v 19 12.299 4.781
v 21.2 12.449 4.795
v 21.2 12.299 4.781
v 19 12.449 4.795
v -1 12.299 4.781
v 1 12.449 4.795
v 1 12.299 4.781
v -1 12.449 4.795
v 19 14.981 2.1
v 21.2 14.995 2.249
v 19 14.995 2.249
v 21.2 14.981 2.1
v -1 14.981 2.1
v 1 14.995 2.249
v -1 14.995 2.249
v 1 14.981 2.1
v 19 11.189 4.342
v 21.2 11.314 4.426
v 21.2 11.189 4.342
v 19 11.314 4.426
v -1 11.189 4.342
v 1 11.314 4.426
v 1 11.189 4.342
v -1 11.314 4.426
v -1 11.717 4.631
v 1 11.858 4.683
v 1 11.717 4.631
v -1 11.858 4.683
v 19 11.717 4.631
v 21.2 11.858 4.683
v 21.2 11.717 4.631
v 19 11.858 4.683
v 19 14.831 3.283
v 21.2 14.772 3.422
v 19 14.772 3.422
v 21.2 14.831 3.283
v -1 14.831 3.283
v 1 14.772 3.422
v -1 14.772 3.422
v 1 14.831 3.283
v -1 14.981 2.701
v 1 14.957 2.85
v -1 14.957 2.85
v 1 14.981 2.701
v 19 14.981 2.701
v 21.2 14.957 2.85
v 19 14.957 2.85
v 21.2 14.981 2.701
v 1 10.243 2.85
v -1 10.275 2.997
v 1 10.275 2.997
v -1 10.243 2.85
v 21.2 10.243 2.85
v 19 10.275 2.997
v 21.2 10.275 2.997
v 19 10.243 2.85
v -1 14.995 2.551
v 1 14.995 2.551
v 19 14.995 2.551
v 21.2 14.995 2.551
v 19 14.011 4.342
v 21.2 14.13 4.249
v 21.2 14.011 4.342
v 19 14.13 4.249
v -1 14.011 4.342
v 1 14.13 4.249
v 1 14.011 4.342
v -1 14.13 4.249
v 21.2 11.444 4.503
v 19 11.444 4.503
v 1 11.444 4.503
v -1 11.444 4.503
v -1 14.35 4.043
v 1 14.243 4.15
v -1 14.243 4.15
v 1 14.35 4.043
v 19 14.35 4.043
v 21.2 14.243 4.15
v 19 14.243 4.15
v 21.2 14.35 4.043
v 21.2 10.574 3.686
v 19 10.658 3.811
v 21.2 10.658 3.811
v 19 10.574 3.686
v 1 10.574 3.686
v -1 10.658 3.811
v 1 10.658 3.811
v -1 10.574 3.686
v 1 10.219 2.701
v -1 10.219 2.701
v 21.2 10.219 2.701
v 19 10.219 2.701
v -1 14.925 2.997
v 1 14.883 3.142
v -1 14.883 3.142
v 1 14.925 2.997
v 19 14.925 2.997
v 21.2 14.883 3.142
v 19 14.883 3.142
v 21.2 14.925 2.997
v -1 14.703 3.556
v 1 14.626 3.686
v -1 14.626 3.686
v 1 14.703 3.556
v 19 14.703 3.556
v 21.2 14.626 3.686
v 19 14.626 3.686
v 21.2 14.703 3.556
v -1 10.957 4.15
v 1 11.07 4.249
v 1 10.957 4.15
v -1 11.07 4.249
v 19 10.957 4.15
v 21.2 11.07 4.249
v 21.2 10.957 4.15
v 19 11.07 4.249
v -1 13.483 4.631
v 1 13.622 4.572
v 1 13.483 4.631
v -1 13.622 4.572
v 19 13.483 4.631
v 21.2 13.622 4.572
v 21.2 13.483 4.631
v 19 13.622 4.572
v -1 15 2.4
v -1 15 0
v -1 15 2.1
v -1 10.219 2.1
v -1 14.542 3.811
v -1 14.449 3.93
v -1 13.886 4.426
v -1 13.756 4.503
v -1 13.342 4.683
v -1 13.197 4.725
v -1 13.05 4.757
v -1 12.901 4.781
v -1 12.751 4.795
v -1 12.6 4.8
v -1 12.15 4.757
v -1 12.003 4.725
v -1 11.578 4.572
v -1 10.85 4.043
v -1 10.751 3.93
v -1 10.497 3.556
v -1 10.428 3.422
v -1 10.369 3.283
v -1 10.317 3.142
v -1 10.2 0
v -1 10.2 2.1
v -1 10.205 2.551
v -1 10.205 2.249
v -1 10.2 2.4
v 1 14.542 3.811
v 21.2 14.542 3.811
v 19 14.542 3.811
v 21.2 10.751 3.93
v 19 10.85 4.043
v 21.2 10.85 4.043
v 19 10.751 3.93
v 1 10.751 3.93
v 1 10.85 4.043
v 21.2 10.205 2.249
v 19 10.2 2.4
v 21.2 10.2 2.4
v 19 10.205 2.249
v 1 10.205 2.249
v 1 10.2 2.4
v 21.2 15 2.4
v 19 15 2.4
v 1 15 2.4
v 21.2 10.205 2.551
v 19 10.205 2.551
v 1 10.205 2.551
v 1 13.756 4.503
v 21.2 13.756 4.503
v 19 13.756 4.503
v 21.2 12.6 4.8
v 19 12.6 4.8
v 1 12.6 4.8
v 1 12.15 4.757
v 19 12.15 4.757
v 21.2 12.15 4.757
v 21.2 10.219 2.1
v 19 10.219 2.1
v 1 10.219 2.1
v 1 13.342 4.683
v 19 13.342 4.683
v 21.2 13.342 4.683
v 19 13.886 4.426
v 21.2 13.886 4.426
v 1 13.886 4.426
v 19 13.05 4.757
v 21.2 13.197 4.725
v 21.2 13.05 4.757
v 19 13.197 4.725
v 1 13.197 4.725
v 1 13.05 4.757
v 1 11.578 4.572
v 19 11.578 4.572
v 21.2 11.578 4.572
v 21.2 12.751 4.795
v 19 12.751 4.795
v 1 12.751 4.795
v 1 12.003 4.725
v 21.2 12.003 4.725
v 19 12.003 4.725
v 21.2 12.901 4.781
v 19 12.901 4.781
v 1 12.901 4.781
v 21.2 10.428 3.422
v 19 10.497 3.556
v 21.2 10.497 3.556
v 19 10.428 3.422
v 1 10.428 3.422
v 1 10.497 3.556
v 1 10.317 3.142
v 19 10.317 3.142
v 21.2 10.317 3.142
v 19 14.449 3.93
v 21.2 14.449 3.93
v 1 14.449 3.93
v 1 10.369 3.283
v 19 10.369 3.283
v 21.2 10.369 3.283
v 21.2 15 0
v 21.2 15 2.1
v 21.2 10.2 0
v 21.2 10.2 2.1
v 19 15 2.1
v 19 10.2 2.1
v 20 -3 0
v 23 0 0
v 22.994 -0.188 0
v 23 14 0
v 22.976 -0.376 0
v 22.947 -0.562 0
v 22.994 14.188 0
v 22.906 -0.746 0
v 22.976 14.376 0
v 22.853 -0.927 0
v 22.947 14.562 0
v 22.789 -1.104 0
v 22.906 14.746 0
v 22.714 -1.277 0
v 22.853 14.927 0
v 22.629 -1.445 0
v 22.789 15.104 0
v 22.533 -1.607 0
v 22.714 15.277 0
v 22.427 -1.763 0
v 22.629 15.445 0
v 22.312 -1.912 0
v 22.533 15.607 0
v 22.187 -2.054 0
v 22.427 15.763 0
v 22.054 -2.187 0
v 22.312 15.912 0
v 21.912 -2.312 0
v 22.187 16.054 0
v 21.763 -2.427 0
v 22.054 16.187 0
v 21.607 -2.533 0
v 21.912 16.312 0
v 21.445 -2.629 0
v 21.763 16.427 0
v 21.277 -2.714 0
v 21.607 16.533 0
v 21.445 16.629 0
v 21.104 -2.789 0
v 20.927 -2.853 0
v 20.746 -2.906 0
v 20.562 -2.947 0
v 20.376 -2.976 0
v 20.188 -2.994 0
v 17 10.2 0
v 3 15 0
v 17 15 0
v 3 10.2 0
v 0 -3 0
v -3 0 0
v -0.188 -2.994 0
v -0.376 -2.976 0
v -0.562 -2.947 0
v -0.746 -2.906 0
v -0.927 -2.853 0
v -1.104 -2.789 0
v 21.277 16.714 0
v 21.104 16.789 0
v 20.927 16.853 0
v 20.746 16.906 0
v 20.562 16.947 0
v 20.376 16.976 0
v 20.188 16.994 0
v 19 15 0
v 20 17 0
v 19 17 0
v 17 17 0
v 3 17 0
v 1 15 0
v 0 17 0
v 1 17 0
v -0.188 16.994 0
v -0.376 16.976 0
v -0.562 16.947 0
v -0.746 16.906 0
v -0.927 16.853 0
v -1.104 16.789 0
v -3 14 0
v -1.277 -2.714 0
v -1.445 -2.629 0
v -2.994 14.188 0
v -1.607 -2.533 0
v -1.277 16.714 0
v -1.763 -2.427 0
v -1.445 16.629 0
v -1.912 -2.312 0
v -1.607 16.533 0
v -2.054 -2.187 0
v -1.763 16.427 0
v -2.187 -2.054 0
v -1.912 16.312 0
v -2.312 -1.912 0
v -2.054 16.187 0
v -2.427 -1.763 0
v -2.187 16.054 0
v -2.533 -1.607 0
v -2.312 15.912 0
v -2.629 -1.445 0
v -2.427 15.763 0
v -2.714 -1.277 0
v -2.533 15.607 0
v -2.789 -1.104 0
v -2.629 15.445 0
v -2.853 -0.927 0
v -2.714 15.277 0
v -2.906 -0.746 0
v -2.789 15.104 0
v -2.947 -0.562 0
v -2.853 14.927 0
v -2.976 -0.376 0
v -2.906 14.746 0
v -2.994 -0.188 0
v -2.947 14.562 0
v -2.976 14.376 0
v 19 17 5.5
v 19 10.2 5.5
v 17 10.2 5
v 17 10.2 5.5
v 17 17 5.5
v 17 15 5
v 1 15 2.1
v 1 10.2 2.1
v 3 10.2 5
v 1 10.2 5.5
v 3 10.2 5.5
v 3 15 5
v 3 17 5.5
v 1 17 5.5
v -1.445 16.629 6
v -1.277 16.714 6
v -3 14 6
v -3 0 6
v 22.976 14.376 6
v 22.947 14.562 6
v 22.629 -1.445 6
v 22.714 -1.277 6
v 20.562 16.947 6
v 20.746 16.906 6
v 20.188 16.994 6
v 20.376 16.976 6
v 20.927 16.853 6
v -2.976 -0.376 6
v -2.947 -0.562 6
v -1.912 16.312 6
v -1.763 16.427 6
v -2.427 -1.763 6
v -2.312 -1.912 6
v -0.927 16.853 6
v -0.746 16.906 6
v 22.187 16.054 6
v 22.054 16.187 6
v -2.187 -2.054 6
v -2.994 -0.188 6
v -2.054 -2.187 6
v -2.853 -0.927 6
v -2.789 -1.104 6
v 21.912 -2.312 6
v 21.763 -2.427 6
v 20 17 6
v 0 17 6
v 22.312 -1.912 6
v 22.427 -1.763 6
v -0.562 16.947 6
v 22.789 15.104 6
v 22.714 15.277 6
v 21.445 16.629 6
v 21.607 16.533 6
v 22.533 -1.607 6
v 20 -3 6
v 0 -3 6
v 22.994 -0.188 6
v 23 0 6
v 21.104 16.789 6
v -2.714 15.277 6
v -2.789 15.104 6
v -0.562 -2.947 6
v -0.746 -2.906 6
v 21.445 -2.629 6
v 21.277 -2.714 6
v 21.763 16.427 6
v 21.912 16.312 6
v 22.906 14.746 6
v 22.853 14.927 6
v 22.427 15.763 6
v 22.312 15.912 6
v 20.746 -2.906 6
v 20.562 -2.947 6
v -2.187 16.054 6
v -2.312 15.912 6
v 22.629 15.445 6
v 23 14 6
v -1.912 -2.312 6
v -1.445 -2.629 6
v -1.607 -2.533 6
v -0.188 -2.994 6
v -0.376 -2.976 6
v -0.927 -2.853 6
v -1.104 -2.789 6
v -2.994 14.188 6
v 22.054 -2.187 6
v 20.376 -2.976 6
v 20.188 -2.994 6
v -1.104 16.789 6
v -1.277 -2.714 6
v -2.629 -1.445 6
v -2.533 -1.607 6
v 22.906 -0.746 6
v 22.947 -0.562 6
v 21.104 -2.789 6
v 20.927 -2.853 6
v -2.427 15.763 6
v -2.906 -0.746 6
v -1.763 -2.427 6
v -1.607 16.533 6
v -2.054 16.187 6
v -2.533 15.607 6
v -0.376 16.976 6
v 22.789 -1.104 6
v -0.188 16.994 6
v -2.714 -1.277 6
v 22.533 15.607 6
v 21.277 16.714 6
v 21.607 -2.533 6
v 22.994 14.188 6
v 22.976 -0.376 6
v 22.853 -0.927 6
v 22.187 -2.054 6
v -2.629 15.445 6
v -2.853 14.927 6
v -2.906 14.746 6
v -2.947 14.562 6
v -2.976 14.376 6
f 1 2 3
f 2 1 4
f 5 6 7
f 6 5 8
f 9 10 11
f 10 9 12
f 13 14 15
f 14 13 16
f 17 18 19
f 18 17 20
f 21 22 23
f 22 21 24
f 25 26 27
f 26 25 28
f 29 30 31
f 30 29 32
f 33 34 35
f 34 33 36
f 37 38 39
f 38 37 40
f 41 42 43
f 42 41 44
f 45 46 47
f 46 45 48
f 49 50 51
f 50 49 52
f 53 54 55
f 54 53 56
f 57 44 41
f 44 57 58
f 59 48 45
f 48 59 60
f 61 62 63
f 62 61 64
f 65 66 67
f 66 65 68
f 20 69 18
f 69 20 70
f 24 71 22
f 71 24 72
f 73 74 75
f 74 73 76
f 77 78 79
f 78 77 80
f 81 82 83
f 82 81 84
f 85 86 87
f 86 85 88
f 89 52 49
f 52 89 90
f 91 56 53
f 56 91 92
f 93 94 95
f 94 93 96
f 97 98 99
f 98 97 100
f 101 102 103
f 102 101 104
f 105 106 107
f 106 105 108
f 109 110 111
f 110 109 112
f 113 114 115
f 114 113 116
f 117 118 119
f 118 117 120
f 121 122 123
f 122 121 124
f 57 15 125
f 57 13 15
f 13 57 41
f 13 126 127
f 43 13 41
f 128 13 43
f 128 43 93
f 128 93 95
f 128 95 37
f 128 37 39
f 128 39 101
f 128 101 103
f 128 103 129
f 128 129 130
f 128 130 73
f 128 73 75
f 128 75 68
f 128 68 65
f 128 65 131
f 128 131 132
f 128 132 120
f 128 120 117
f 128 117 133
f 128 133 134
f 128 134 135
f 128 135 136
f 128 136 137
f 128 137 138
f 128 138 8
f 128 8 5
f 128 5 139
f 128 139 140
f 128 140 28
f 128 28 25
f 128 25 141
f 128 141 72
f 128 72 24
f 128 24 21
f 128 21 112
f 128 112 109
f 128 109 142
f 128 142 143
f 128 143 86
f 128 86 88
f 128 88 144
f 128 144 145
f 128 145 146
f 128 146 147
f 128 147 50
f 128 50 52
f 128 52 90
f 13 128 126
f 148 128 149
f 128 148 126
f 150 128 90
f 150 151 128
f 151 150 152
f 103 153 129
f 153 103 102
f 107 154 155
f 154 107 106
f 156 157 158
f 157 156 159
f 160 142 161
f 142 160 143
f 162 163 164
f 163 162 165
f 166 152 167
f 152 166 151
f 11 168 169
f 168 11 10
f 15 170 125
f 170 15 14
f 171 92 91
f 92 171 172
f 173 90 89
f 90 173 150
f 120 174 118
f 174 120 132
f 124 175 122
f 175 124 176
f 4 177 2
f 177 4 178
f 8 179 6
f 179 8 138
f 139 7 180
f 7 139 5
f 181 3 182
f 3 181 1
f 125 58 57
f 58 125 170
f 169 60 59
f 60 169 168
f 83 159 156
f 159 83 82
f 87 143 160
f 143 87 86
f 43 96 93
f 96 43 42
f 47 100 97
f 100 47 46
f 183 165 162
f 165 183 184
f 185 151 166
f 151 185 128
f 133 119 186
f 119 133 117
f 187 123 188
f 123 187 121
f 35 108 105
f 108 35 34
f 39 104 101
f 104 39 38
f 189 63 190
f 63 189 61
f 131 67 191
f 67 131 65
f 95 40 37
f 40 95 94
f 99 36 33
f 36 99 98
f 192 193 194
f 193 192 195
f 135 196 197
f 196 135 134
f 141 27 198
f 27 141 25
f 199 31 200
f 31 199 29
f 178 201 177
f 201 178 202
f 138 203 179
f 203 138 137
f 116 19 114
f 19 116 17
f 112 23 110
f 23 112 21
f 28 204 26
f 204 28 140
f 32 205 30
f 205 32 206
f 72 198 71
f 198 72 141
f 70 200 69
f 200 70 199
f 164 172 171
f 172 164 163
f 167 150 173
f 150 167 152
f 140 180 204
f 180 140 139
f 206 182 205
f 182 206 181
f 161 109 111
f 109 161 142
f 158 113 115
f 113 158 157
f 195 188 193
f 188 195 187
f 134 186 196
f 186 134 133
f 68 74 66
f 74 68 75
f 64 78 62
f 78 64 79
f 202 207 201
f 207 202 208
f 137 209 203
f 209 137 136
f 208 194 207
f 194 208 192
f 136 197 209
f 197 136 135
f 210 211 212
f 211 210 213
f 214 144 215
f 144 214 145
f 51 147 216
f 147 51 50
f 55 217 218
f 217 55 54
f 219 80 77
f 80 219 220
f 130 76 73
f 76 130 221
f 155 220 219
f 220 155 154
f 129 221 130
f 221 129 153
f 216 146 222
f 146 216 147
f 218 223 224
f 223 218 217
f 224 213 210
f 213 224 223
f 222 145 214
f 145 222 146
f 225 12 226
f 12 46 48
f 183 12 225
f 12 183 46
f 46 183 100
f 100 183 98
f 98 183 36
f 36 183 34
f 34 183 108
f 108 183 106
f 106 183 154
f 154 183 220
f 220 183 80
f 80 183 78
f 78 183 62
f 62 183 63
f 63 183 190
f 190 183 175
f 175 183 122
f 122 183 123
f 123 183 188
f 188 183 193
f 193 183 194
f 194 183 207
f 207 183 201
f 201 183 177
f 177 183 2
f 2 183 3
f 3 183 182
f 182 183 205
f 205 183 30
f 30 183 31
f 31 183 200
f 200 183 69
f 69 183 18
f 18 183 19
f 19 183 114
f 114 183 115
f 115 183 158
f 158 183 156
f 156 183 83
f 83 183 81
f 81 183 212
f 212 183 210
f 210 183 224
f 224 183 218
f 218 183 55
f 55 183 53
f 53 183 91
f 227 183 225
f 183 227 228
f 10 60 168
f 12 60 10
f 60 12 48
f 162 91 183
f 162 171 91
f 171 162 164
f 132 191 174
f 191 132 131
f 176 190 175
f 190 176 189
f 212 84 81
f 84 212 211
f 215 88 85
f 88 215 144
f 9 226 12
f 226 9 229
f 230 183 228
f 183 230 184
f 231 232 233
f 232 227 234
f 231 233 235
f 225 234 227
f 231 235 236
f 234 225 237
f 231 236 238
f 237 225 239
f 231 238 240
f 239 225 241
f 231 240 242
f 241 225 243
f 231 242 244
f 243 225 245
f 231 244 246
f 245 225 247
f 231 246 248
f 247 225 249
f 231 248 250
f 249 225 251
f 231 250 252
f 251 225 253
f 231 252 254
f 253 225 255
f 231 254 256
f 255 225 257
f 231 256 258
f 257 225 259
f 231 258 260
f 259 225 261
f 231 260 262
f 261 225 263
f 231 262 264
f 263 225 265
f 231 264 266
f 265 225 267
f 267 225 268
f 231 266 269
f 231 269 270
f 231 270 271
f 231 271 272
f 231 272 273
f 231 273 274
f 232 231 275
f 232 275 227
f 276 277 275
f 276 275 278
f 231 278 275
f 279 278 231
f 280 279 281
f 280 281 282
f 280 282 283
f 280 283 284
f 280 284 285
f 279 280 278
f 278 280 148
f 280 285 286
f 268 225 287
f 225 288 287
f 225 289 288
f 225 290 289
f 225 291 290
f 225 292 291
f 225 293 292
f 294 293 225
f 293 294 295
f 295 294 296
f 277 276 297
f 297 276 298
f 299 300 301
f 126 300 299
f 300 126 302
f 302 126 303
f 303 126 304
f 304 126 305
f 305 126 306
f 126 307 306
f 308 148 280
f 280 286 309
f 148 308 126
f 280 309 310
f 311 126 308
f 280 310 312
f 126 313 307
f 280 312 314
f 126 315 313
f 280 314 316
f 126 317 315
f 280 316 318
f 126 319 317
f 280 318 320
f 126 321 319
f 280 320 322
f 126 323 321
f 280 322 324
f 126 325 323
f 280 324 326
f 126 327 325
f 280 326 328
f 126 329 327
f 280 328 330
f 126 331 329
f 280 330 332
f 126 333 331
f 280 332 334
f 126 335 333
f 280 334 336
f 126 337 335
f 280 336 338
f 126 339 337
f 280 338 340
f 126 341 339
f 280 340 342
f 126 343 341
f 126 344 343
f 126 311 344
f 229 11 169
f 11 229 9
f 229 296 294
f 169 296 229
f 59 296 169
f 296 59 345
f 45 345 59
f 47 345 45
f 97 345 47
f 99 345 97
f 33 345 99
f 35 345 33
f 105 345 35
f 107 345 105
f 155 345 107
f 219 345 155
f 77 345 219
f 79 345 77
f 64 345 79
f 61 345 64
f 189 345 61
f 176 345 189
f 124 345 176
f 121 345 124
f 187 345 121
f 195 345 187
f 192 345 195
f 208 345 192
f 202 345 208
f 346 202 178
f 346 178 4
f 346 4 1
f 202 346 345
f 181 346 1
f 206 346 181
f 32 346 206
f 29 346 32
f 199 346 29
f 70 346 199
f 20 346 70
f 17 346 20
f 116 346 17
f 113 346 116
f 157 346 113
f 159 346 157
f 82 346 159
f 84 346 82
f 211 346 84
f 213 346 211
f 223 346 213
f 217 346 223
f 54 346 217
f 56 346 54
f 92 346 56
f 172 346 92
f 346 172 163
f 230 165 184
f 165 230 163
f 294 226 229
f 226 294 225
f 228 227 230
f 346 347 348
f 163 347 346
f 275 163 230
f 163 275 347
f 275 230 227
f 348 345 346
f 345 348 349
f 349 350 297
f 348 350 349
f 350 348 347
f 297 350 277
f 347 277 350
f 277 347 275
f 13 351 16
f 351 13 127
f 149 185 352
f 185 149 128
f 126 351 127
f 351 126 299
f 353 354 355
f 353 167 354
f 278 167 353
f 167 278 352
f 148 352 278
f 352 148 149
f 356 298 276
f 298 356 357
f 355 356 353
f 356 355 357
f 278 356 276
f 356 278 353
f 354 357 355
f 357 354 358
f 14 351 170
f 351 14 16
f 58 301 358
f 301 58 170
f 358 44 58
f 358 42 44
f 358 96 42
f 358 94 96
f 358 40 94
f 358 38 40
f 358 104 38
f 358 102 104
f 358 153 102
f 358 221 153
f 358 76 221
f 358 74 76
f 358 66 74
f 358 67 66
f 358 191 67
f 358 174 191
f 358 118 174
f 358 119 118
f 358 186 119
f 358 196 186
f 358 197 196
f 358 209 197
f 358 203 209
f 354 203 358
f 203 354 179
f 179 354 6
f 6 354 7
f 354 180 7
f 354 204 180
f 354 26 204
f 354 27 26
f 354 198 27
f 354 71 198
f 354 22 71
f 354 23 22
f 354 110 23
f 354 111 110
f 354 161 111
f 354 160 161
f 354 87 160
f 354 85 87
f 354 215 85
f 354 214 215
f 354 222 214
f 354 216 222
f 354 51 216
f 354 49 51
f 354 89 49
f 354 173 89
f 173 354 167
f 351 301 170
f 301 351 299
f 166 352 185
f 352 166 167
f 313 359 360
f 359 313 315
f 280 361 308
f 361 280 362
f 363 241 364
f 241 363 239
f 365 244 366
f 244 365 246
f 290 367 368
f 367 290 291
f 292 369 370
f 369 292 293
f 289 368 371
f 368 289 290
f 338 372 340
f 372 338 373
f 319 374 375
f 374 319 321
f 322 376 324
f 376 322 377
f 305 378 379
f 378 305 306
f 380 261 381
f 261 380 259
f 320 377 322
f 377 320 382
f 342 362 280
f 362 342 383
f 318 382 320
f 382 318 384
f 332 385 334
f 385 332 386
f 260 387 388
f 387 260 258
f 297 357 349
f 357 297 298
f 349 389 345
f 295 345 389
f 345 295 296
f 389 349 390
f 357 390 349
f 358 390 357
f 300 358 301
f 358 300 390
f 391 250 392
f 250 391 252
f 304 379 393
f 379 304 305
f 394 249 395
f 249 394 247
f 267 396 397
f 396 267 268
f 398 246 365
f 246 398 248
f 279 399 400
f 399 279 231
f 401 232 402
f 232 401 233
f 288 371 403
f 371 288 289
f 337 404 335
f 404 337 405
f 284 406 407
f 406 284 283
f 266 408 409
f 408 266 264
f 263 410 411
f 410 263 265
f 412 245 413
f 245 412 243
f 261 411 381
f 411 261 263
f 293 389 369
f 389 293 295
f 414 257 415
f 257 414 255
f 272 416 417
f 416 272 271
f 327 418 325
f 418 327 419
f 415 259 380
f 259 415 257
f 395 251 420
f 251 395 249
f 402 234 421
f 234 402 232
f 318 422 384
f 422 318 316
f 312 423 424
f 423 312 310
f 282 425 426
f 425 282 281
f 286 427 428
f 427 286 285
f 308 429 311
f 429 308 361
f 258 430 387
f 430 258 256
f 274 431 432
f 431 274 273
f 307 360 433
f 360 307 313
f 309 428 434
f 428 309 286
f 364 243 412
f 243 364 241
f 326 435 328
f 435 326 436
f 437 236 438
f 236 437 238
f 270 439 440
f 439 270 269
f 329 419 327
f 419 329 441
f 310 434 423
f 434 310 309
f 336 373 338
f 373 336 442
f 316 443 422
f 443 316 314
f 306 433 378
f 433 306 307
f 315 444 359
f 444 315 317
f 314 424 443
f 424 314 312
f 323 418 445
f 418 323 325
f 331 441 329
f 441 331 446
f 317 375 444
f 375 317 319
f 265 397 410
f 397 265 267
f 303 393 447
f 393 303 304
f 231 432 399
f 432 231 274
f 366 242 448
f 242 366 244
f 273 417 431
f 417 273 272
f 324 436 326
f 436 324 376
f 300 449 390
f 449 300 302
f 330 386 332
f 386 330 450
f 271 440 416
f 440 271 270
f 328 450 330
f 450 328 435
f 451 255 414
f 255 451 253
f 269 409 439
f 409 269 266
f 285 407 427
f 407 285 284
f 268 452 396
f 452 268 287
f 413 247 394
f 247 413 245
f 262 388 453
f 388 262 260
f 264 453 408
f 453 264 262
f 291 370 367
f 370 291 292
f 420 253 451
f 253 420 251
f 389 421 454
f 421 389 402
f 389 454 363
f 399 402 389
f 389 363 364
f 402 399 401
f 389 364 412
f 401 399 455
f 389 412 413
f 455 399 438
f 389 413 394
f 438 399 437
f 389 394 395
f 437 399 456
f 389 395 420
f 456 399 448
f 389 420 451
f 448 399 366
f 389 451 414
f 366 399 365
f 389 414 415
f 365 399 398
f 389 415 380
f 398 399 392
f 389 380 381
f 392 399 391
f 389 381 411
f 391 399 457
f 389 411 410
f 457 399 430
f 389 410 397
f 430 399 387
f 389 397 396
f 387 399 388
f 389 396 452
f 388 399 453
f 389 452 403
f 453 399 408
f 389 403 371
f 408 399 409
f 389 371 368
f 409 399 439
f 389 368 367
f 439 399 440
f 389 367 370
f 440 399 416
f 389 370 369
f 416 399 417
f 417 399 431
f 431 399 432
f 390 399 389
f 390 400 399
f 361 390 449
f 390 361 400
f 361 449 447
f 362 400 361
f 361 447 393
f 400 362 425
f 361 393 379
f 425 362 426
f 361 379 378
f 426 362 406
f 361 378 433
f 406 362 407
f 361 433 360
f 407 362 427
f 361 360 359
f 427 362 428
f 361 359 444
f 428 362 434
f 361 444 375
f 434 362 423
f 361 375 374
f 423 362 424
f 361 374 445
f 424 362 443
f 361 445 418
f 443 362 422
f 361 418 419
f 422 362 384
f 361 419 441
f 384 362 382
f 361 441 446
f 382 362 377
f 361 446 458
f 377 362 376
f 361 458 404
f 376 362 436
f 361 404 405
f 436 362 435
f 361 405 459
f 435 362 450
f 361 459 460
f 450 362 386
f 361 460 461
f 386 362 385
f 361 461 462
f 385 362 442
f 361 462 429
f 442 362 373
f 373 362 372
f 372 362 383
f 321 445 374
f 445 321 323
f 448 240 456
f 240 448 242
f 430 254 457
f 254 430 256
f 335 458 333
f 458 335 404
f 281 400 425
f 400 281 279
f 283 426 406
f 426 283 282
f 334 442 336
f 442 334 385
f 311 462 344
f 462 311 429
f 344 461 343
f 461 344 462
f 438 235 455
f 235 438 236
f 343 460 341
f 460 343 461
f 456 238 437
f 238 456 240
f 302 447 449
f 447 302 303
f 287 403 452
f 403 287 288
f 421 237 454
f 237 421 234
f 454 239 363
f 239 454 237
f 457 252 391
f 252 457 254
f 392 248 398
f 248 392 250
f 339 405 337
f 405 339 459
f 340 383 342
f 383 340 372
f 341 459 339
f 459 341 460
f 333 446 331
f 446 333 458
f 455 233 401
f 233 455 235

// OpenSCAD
$fn=100;

stand1();

module stand0(){
    difference(){
        union(){
            translate([-4,-1.5,2])
            rotate([0,90,0])
            cylinder(r=2,h=22);

            minkowski()
            {
              cube([14,55,1.5]);
              cylinder(r=2,h=1.5);
            }
        }

        translate([0,-4,0])cube([14,10,4]);
    }
}

module stand1(){
    difference(){
        minkowski()
        {
          cube([20,14,3]);
          cylinder(r=3,h=3);
        }

        difference(){
            union(){
                translate([-1,12.6,2.4])rotate([0,90,0])cylinder(r=2.4,h=22.2);
                
                translate([19,10.2,0])cube([2.2,4.8,2.1]);
                translate([17,10.2,0])cube([2,8,5.5]);
                
                translate([-1,10.2,0])cube([2.2,4.8,2.1]);
                translate([1,10.2,0])cube([2,8,5.5]);
            }
            translate([3,10,0])cube([14,5,5]);
        }
    }
}
